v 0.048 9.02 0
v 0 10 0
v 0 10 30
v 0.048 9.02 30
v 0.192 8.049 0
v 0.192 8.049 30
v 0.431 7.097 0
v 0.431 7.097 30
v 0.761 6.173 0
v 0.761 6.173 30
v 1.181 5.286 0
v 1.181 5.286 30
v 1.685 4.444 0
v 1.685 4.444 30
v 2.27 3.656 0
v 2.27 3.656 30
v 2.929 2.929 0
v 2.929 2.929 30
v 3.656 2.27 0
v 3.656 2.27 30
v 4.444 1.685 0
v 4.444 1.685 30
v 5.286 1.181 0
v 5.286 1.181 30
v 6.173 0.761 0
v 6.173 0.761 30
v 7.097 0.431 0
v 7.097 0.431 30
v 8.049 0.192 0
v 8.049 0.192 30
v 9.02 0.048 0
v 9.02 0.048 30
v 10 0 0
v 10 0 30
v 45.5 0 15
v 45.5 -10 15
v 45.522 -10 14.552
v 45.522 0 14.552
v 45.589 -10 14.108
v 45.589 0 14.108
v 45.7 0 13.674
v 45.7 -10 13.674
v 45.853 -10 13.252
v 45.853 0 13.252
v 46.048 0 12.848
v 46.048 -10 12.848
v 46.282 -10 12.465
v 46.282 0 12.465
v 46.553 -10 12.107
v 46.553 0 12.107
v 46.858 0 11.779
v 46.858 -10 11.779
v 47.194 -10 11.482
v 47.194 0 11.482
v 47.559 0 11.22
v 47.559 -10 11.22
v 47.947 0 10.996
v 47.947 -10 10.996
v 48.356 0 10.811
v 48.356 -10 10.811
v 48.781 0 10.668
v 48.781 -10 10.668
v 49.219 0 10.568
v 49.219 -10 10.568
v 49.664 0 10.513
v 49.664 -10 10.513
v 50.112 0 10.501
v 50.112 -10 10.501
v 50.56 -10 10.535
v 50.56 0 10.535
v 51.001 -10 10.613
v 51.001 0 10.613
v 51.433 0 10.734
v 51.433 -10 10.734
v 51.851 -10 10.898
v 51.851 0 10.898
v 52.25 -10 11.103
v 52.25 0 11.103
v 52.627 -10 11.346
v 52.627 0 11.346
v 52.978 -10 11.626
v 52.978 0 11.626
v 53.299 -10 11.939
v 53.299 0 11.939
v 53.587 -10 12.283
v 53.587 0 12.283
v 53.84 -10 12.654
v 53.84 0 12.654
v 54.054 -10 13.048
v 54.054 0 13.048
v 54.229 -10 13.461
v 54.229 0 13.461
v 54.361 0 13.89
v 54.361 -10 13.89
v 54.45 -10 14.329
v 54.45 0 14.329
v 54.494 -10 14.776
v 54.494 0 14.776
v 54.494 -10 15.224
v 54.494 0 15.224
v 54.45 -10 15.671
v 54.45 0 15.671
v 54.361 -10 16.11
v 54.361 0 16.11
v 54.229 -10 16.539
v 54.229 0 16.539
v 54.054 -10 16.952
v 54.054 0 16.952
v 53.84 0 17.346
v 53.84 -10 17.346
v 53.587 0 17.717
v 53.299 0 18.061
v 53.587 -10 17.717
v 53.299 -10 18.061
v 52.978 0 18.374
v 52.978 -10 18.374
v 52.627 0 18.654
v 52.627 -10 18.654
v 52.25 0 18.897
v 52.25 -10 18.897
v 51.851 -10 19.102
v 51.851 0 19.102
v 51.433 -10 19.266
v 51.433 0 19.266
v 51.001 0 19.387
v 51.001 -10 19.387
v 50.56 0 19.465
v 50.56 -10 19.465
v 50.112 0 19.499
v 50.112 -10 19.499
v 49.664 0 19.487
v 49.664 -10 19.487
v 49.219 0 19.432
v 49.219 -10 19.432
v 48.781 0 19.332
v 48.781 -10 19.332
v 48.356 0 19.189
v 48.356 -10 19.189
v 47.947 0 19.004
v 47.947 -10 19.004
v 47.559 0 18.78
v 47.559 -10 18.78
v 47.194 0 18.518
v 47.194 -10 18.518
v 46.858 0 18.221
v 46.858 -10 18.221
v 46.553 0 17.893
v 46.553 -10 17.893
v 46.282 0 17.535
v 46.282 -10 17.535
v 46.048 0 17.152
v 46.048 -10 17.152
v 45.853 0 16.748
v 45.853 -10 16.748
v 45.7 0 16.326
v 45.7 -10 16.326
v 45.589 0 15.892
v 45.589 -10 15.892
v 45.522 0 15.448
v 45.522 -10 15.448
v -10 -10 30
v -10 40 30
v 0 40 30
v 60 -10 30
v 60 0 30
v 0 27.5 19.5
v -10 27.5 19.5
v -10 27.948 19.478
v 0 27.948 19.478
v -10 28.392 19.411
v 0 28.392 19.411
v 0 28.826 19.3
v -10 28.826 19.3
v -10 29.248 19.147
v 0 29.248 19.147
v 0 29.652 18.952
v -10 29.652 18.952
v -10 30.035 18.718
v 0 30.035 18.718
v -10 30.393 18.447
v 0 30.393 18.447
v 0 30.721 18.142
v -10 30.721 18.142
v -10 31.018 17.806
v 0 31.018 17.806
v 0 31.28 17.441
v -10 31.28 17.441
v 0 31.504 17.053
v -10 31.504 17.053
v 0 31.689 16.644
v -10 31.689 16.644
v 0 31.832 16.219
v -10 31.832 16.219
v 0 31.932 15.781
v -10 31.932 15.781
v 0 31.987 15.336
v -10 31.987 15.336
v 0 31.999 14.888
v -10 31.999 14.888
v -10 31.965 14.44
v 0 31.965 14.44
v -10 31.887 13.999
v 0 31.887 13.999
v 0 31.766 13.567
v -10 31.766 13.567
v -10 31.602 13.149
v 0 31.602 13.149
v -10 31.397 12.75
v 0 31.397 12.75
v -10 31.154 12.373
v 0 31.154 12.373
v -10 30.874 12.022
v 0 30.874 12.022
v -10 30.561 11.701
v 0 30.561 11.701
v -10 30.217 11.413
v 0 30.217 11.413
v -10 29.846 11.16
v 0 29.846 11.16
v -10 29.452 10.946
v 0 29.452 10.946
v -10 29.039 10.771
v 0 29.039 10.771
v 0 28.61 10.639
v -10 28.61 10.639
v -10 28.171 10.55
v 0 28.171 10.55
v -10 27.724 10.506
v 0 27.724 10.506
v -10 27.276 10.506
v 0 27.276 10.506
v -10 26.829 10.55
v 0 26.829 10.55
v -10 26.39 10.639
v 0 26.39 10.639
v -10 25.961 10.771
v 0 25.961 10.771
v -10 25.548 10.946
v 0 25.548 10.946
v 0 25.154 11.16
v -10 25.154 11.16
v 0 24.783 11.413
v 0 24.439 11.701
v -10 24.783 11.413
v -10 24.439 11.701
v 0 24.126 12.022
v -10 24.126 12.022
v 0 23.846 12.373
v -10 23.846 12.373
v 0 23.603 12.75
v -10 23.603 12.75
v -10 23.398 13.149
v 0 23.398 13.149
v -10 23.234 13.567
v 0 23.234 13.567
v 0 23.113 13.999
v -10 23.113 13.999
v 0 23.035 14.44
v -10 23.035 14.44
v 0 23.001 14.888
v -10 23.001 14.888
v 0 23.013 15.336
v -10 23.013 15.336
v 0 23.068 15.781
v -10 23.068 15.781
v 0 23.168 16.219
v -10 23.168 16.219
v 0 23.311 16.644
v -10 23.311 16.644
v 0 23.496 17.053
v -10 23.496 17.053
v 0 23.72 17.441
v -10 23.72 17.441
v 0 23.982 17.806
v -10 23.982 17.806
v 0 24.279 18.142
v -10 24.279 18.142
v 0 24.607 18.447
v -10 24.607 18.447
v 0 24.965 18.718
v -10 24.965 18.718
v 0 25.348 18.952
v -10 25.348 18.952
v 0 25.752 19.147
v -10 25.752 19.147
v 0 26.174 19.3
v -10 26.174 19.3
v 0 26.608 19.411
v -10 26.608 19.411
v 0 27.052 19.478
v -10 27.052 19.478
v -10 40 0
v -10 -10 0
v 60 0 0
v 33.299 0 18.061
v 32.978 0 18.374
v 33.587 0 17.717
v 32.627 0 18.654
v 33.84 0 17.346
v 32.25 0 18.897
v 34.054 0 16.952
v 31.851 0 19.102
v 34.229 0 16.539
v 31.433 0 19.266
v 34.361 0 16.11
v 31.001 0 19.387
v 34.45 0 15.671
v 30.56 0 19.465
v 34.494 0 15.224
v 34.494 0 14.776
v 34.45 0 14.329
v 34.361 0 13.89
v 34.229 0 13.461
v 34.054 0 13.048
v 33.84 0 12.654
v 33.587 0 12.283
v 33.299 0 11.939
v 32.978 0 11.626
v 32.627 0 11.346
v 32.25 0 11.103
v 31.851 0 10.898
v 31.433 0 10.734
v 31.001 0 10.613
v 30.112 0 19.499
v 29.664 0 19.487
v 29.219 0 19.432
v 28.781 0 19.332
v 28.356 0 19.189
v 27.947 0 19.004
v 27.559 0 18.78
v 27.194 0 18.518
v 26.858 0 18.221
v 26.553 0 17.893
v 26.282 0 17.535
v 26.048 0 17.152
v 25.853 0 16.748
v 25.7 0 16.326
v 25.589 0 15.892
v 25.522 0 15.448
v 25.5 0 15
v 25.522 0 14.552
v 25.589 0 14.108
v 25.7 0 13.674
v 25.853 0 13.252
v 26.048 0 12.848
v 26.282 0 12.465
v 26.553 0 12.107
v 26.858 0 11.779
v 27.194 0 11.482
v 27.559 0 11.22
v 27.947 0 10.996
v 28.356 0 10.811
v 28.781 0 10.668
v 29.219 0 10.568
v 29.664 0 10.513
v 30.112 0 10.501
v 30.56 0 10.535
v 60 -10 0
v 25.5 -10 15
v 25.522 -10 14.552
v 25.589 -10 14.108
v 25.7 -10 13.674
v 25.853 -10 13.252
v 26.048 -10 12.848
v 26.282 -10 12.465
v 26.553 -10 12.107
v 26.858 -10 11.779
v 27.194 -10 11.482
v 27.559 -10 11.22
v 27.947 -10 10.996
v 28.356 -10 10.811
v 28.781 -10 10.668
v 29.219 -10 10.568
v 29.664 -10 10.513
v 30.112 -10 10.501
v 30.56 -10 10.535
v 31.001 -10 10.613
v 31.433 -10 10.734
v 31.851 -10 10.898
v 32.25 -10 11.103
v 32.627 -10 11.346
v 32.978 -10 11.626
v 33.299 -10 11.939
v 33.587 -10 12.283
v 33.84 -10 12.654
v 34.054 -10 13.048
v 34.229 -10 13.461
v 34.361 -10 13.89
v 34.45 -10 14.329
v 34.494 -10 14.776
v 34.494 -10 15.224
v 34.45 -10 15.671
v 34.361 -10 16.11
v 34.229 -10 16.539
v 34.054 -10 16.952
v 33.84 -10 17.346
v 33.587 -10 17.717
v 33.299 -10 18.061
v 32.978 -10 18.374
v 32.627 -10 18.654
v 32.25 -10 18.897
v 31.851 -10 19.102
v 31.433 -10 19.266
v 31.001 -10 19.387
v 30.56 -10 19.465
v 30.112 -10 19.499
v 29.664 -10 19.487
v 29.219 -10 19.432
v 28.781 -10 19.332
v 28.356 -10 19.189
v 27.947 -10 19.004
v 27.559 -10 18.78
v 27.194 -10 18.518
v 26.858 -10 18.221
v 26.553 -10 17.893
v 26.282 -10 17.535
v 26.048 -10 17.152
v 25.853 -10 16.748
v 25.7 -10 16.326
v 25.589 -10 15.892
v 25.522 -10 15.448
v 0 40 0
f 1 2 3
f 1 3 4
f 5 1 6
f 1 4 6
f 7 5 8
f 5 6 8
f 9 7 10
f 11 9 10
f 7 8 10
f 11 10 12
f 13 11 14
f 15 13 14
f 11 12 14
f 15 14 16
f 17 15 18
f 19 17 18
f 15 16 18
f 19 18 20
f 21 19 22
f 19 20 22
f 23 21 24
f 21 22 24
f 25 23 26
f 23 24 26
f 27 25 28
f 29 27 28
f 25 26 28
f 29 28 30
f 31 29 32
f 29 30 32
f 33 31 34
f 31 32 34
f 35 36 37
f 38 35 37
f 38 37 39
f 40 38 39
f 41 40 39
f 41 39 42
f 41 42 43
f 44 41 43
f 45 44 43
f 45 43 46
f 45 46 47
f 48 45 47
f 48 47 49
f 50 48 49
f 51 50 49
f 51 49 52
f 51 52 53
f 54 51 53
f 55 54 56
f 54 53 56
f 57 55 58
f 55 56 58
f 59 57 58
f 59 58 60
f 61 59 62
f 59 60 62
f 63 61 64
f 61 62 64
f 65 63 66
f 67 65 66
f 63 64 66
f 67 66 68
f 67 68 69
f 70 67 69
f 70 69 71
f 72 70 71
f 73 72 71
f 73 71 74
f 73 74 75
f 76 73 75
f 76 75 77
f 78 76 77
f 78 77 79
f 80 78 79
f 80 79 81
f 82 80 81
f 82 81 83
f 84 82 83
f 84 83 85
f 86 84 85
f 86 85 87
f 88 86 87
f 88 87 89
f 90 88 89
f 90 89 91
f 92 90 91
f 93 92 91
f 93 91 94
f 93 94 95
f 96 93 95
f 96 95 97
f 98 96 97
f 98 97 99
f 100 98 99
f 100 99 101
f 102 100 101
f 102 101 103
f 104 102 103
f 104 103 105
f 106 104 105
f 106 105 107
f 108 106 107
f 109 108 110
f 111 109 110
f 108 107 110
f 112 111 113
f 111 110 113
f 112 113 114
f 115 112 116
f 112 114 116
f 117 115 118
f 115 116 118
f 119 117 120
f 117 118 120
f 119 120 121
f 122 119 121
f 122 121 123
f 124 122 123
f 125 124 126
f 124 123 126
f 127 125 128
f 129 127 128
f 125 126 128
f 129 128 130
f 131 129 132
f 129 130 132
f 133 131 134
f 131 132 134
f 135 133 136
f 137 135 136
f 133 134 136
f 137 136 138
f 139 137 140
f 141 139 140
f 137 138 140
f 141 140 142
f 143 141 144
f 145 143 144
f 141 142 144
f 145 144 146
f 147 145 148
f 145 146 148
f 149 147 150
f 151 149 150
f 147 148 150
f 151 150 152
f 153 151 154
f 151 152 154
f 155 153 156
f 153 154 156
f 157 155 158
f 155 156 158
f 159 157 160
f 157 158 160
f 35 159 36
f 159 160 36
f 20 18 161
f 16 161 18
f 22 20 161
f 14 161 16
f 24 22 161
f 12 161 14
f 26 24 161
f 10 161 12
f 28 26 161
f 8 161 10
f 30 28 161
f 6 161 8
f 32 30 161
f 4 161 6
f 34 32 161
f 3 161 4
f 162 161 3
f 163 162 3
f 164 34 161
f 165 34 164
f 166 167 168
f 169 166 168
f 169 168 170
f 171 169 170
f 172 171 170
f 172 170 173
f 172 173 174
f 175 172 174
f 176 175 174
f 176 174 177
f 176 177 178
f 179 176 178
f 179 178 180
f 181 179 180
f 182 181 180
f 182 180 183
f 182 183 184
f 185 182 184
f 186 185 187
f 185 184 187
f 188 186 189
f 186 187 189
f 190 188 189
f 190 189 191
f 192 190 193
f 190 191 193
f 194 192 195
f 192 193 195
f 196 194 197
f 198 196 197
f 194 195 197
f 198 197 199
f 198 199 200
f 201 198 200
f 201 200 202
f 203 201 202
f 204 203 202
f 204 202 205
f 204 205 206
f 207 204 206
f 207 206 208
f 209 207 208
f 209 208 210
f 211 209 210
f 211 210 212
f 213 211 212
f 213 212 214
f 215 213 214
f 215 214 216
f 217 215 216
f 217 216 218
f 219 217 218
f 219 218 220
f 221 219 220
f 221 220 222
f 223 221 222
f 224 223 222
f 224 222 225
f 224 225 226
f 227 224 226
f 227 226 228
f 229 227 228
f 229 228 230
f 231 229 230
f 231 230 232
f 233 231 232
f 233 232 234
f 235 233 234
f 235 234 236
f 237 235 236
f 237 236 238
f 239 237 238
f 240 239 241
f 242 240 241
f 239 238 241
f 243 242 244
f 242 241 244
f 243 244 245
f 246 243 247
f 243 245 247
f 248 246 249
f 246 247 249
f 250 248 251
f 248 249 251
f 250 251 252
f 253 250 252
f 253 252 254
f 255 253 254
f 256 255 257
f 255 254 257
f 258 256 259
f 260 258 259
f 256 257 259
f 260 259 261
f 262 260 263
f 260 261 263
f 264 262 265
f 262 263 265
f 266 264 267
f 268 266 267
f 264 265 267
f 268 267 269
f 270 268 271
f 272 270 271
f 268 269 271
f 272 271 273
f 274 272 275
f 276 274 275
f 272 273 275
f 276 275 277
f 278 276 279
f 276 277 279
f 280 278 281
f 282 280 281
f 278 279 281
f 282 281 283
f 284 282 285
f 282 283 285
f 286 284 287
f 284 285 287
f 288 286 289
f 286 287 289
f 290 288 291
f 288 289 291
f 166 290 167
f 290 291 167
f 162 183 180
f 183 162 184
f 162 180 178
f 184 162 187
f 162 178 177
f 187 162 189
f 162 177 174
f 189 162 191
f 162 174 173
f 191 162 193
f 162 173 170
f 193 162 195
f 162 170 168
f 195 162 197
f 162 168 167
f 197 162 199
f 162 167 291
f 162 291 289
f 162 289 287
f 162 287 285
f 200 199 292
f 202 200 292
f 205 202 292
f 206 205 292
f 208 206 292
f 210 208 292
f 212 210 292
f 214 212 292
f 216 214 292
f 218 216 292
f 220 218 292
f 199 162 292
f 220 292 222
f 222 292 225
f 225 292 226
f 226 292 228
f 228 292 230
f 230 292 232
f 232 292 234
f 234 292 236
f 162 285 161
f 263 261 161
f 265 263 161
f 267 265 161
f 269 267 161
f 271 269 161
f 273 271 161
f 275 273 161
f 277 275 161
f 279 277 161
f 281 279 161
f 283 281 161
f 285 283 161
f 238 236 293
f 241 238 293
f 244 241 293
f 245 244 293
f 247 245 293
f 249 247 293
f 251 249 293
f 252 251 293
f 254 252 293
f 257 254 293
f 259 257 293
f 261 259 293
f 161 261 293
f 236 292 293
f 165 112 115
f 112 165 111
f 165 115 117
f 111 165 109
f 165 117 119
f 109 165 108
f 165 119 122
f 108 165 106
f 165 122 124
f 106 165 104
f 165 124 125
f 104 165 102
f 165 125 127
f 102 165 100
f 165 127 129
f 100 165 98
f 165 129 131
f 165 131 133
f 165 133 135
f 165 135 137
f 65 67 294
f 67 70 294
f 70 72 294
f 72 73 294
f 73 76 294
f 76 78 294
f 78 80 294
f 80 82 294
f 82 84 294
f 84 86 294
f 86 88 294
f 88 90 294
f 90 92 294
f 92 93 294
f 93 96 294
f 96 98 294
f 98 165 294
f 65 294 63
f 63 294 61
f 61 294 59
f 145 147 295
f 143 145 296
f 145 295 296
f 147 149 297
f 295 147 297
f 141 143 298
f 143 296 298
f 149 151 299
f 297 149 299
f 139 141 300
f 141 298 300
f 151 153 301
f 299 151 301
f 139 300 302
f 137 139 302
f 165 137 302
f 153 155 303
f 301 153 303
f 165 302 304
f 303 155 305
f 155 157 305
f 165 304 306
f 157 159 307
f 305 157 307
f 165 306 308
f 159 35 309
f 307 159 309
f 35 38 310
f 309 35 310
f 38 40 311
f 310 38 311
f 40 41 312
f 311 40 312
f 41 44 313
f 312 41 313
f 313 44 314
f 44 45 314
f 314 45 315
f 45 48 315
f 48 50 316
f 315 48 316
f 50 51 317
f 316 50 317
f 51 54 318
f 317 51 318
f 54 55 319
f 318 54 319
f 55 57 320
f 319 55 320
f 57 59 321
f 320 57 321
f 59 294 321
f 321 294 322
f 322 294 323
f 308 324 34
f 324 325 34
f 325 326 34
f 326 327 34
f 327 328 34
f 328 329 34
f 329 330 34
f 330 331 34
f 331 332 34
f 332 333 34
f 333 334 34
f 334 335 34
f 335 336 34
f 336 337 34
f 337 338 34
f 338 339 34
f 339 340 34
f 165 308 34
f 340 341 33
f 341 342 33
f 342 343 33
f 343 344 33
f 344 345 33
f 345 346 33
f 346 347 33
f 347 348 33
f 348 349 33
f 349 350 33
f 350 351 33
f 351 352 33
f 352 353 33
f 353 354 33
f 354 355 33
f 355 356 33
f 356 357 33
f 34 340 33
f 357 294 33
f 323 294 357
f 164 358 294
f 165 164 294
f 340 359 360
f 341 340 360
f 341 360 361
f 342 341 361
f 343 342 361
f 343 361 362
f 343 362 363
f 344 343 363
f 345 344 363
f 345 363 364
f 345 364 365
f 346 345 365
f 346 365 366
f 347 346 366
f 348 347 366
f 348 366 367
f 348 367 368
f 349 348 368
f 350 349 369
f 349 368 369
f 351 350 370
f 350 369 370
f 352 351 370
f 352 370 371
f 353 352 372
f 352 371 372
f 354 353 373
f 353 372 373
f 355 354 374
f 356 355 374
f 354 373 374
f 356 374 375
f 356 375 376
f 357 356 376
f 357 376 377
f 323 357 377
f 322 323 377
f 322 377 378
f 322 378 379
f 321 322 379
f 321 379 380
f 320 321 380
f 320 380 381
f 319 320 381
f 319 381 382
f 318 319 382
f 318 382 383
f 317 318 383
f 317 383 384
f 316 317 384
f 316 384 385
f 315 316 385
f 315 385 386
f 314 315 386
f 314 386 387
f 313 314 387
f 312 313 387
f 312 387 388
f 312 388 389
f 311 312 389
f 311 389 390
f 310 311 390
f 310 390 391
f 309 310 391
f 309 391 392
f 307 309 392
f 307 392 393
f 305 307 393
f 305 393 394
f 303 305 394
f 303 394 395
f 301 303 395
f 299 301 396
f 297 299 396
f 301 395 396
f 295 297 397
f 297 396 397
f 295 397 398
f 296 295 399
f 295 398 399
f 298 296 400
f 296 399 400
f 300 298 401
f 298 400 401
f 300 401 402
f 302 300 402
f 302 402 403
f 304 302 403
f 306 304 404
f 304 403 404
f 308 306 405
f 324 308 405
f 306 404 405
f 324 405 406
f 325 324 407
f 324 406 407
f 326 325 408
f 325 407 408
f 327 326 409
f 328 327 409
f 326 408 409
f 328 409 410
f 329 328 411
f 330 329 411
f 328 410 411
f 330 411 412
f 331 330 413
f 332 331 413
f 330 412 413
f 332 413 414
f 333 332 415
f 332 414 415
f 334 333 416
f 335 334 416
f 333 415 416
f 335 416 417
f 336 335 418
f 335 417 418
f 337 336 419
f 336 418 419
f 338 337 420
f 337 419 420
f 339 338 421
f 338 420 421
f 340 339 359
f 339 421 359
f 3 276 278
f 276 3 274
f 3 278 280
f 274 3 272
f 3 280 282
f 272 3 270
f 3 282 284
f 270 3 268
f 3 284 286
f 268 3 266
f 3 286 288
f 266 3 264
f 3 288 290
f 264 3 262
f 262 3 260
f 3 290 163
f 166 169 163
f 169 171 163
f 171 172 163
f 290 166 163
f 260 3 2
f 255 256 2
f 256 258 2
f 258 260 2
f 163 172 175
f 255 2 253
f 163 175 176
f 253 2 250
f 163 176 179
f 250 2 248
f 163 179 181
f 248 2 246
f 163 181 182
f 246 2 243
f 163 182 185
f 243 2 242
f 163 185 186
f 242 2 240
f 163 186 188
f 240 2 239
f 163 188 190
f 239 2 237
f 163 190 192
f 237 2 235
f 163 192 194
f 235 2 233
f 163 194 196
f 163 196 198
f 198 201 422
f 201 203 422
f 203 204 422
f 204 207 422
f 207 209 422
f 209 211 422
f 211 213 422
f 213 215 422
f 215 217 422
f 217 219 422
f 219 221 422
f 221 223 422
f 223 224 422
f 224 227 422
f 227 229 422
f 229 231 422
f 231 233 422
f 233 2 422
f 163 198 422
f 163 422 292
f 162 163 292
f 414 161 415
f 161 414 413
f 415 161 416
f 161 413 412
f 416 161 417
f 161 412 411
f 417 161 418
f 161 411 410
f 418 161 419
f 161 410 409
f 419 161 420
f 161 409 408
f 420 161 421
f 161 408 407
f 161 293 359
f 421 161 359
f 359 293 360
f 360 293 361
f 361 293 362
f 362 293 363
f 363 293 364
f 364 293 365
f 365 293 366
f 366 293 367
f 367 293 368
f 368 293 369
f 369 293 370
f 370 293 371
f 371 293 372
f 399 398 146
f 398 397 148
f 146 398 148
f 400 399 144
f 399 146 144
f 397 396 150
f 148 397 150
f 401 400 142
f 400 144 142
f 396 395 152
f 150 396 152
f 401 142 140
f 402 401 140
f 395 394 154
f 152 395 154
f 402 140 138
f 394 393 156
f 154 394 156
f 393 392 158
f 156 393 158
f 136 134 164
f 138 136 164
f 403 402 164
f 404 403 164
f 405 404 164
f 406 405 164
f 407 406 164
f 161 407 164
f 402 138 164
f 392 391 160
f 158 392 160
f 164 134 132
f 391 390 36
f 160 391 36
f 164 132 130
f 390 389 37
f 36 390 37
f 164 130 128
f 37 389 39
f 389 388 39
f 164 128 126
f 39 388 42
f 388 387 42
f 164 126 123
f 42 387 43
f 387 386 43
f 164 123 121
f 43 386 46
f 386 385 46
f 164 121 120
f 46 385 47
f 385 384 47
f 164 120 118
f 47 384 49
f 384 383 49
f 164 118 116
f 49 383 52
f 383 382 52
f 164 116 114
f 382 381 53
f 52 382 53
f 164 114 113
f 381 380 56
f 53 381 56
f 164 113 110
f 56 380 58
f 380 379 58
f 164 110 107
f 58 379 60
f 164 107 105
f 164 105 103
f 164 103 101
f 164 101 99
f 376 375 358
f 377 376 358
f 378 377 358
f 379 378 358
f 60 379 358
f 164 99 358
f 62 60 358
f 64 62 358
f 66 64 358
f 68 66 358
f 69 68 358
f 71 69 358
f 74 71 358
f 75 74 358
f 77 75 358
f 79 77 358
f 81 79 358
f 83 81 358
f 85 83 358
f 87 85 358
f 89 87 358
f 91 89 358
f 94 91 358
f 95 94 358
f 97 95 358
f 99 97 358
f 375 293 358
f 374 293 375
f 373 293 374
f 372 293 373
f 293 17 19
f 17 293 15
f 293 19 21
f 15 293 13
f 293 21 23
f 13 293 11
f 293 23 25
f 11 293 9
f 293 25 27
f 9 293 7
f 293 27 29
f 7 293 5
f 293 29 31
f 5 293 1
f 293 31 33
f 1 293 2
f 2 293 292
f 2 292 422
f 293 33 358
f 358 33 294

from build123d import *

# Parameters (mm, degrees)
BOSS_EXTRUDE1_DEPTH  = 30
M8_CLEARANCE_HOLE1_D = 9
M8_CLEARANCE_HOLE2_D = 9
FILLET1_R            = 10


with BuildPart() as part:
    # Sketch1 → Boss-Extrude1 (new body)
    with BuildSketch(Plane.XY):
        Polygon((0, 0), (0, 40), (-10, 40), (-10, -10), (10, -10), (60, -10), (60, 0), align=None)
    extrude(amount=BOSS_EXTRUDE1_DEPTH)

    # M8 Clearance Hole1 (through all)
    with Locations(Plane(origin=(0, 0, 0), x_dir=(0, 0, -1), z_dir=(1, 0, 0))):
        with Locations((-15, 27.5)):
            Hole(M8_CLEARANCE_HOLE1_D / 2)

    # M8 Clearance Hole2 (through all)
    with Locations(Plane(origin=(0, 0, 0), x_dir=(1, 0, 0), z_dir=(0, 1, 0))):
        with Locations((30, -15), (50, -15)):
            Hole(M8_CLEARANCE_HOLE2_D / 2)

    # Fillet1
    fillet1_edges = [part.edges().sort_by_distance(p)[0] for p in [
        (0, 0, 15),
    ]]
    fillet(fillet1_edges, radius=FILLET1_R)


solid = part.part
